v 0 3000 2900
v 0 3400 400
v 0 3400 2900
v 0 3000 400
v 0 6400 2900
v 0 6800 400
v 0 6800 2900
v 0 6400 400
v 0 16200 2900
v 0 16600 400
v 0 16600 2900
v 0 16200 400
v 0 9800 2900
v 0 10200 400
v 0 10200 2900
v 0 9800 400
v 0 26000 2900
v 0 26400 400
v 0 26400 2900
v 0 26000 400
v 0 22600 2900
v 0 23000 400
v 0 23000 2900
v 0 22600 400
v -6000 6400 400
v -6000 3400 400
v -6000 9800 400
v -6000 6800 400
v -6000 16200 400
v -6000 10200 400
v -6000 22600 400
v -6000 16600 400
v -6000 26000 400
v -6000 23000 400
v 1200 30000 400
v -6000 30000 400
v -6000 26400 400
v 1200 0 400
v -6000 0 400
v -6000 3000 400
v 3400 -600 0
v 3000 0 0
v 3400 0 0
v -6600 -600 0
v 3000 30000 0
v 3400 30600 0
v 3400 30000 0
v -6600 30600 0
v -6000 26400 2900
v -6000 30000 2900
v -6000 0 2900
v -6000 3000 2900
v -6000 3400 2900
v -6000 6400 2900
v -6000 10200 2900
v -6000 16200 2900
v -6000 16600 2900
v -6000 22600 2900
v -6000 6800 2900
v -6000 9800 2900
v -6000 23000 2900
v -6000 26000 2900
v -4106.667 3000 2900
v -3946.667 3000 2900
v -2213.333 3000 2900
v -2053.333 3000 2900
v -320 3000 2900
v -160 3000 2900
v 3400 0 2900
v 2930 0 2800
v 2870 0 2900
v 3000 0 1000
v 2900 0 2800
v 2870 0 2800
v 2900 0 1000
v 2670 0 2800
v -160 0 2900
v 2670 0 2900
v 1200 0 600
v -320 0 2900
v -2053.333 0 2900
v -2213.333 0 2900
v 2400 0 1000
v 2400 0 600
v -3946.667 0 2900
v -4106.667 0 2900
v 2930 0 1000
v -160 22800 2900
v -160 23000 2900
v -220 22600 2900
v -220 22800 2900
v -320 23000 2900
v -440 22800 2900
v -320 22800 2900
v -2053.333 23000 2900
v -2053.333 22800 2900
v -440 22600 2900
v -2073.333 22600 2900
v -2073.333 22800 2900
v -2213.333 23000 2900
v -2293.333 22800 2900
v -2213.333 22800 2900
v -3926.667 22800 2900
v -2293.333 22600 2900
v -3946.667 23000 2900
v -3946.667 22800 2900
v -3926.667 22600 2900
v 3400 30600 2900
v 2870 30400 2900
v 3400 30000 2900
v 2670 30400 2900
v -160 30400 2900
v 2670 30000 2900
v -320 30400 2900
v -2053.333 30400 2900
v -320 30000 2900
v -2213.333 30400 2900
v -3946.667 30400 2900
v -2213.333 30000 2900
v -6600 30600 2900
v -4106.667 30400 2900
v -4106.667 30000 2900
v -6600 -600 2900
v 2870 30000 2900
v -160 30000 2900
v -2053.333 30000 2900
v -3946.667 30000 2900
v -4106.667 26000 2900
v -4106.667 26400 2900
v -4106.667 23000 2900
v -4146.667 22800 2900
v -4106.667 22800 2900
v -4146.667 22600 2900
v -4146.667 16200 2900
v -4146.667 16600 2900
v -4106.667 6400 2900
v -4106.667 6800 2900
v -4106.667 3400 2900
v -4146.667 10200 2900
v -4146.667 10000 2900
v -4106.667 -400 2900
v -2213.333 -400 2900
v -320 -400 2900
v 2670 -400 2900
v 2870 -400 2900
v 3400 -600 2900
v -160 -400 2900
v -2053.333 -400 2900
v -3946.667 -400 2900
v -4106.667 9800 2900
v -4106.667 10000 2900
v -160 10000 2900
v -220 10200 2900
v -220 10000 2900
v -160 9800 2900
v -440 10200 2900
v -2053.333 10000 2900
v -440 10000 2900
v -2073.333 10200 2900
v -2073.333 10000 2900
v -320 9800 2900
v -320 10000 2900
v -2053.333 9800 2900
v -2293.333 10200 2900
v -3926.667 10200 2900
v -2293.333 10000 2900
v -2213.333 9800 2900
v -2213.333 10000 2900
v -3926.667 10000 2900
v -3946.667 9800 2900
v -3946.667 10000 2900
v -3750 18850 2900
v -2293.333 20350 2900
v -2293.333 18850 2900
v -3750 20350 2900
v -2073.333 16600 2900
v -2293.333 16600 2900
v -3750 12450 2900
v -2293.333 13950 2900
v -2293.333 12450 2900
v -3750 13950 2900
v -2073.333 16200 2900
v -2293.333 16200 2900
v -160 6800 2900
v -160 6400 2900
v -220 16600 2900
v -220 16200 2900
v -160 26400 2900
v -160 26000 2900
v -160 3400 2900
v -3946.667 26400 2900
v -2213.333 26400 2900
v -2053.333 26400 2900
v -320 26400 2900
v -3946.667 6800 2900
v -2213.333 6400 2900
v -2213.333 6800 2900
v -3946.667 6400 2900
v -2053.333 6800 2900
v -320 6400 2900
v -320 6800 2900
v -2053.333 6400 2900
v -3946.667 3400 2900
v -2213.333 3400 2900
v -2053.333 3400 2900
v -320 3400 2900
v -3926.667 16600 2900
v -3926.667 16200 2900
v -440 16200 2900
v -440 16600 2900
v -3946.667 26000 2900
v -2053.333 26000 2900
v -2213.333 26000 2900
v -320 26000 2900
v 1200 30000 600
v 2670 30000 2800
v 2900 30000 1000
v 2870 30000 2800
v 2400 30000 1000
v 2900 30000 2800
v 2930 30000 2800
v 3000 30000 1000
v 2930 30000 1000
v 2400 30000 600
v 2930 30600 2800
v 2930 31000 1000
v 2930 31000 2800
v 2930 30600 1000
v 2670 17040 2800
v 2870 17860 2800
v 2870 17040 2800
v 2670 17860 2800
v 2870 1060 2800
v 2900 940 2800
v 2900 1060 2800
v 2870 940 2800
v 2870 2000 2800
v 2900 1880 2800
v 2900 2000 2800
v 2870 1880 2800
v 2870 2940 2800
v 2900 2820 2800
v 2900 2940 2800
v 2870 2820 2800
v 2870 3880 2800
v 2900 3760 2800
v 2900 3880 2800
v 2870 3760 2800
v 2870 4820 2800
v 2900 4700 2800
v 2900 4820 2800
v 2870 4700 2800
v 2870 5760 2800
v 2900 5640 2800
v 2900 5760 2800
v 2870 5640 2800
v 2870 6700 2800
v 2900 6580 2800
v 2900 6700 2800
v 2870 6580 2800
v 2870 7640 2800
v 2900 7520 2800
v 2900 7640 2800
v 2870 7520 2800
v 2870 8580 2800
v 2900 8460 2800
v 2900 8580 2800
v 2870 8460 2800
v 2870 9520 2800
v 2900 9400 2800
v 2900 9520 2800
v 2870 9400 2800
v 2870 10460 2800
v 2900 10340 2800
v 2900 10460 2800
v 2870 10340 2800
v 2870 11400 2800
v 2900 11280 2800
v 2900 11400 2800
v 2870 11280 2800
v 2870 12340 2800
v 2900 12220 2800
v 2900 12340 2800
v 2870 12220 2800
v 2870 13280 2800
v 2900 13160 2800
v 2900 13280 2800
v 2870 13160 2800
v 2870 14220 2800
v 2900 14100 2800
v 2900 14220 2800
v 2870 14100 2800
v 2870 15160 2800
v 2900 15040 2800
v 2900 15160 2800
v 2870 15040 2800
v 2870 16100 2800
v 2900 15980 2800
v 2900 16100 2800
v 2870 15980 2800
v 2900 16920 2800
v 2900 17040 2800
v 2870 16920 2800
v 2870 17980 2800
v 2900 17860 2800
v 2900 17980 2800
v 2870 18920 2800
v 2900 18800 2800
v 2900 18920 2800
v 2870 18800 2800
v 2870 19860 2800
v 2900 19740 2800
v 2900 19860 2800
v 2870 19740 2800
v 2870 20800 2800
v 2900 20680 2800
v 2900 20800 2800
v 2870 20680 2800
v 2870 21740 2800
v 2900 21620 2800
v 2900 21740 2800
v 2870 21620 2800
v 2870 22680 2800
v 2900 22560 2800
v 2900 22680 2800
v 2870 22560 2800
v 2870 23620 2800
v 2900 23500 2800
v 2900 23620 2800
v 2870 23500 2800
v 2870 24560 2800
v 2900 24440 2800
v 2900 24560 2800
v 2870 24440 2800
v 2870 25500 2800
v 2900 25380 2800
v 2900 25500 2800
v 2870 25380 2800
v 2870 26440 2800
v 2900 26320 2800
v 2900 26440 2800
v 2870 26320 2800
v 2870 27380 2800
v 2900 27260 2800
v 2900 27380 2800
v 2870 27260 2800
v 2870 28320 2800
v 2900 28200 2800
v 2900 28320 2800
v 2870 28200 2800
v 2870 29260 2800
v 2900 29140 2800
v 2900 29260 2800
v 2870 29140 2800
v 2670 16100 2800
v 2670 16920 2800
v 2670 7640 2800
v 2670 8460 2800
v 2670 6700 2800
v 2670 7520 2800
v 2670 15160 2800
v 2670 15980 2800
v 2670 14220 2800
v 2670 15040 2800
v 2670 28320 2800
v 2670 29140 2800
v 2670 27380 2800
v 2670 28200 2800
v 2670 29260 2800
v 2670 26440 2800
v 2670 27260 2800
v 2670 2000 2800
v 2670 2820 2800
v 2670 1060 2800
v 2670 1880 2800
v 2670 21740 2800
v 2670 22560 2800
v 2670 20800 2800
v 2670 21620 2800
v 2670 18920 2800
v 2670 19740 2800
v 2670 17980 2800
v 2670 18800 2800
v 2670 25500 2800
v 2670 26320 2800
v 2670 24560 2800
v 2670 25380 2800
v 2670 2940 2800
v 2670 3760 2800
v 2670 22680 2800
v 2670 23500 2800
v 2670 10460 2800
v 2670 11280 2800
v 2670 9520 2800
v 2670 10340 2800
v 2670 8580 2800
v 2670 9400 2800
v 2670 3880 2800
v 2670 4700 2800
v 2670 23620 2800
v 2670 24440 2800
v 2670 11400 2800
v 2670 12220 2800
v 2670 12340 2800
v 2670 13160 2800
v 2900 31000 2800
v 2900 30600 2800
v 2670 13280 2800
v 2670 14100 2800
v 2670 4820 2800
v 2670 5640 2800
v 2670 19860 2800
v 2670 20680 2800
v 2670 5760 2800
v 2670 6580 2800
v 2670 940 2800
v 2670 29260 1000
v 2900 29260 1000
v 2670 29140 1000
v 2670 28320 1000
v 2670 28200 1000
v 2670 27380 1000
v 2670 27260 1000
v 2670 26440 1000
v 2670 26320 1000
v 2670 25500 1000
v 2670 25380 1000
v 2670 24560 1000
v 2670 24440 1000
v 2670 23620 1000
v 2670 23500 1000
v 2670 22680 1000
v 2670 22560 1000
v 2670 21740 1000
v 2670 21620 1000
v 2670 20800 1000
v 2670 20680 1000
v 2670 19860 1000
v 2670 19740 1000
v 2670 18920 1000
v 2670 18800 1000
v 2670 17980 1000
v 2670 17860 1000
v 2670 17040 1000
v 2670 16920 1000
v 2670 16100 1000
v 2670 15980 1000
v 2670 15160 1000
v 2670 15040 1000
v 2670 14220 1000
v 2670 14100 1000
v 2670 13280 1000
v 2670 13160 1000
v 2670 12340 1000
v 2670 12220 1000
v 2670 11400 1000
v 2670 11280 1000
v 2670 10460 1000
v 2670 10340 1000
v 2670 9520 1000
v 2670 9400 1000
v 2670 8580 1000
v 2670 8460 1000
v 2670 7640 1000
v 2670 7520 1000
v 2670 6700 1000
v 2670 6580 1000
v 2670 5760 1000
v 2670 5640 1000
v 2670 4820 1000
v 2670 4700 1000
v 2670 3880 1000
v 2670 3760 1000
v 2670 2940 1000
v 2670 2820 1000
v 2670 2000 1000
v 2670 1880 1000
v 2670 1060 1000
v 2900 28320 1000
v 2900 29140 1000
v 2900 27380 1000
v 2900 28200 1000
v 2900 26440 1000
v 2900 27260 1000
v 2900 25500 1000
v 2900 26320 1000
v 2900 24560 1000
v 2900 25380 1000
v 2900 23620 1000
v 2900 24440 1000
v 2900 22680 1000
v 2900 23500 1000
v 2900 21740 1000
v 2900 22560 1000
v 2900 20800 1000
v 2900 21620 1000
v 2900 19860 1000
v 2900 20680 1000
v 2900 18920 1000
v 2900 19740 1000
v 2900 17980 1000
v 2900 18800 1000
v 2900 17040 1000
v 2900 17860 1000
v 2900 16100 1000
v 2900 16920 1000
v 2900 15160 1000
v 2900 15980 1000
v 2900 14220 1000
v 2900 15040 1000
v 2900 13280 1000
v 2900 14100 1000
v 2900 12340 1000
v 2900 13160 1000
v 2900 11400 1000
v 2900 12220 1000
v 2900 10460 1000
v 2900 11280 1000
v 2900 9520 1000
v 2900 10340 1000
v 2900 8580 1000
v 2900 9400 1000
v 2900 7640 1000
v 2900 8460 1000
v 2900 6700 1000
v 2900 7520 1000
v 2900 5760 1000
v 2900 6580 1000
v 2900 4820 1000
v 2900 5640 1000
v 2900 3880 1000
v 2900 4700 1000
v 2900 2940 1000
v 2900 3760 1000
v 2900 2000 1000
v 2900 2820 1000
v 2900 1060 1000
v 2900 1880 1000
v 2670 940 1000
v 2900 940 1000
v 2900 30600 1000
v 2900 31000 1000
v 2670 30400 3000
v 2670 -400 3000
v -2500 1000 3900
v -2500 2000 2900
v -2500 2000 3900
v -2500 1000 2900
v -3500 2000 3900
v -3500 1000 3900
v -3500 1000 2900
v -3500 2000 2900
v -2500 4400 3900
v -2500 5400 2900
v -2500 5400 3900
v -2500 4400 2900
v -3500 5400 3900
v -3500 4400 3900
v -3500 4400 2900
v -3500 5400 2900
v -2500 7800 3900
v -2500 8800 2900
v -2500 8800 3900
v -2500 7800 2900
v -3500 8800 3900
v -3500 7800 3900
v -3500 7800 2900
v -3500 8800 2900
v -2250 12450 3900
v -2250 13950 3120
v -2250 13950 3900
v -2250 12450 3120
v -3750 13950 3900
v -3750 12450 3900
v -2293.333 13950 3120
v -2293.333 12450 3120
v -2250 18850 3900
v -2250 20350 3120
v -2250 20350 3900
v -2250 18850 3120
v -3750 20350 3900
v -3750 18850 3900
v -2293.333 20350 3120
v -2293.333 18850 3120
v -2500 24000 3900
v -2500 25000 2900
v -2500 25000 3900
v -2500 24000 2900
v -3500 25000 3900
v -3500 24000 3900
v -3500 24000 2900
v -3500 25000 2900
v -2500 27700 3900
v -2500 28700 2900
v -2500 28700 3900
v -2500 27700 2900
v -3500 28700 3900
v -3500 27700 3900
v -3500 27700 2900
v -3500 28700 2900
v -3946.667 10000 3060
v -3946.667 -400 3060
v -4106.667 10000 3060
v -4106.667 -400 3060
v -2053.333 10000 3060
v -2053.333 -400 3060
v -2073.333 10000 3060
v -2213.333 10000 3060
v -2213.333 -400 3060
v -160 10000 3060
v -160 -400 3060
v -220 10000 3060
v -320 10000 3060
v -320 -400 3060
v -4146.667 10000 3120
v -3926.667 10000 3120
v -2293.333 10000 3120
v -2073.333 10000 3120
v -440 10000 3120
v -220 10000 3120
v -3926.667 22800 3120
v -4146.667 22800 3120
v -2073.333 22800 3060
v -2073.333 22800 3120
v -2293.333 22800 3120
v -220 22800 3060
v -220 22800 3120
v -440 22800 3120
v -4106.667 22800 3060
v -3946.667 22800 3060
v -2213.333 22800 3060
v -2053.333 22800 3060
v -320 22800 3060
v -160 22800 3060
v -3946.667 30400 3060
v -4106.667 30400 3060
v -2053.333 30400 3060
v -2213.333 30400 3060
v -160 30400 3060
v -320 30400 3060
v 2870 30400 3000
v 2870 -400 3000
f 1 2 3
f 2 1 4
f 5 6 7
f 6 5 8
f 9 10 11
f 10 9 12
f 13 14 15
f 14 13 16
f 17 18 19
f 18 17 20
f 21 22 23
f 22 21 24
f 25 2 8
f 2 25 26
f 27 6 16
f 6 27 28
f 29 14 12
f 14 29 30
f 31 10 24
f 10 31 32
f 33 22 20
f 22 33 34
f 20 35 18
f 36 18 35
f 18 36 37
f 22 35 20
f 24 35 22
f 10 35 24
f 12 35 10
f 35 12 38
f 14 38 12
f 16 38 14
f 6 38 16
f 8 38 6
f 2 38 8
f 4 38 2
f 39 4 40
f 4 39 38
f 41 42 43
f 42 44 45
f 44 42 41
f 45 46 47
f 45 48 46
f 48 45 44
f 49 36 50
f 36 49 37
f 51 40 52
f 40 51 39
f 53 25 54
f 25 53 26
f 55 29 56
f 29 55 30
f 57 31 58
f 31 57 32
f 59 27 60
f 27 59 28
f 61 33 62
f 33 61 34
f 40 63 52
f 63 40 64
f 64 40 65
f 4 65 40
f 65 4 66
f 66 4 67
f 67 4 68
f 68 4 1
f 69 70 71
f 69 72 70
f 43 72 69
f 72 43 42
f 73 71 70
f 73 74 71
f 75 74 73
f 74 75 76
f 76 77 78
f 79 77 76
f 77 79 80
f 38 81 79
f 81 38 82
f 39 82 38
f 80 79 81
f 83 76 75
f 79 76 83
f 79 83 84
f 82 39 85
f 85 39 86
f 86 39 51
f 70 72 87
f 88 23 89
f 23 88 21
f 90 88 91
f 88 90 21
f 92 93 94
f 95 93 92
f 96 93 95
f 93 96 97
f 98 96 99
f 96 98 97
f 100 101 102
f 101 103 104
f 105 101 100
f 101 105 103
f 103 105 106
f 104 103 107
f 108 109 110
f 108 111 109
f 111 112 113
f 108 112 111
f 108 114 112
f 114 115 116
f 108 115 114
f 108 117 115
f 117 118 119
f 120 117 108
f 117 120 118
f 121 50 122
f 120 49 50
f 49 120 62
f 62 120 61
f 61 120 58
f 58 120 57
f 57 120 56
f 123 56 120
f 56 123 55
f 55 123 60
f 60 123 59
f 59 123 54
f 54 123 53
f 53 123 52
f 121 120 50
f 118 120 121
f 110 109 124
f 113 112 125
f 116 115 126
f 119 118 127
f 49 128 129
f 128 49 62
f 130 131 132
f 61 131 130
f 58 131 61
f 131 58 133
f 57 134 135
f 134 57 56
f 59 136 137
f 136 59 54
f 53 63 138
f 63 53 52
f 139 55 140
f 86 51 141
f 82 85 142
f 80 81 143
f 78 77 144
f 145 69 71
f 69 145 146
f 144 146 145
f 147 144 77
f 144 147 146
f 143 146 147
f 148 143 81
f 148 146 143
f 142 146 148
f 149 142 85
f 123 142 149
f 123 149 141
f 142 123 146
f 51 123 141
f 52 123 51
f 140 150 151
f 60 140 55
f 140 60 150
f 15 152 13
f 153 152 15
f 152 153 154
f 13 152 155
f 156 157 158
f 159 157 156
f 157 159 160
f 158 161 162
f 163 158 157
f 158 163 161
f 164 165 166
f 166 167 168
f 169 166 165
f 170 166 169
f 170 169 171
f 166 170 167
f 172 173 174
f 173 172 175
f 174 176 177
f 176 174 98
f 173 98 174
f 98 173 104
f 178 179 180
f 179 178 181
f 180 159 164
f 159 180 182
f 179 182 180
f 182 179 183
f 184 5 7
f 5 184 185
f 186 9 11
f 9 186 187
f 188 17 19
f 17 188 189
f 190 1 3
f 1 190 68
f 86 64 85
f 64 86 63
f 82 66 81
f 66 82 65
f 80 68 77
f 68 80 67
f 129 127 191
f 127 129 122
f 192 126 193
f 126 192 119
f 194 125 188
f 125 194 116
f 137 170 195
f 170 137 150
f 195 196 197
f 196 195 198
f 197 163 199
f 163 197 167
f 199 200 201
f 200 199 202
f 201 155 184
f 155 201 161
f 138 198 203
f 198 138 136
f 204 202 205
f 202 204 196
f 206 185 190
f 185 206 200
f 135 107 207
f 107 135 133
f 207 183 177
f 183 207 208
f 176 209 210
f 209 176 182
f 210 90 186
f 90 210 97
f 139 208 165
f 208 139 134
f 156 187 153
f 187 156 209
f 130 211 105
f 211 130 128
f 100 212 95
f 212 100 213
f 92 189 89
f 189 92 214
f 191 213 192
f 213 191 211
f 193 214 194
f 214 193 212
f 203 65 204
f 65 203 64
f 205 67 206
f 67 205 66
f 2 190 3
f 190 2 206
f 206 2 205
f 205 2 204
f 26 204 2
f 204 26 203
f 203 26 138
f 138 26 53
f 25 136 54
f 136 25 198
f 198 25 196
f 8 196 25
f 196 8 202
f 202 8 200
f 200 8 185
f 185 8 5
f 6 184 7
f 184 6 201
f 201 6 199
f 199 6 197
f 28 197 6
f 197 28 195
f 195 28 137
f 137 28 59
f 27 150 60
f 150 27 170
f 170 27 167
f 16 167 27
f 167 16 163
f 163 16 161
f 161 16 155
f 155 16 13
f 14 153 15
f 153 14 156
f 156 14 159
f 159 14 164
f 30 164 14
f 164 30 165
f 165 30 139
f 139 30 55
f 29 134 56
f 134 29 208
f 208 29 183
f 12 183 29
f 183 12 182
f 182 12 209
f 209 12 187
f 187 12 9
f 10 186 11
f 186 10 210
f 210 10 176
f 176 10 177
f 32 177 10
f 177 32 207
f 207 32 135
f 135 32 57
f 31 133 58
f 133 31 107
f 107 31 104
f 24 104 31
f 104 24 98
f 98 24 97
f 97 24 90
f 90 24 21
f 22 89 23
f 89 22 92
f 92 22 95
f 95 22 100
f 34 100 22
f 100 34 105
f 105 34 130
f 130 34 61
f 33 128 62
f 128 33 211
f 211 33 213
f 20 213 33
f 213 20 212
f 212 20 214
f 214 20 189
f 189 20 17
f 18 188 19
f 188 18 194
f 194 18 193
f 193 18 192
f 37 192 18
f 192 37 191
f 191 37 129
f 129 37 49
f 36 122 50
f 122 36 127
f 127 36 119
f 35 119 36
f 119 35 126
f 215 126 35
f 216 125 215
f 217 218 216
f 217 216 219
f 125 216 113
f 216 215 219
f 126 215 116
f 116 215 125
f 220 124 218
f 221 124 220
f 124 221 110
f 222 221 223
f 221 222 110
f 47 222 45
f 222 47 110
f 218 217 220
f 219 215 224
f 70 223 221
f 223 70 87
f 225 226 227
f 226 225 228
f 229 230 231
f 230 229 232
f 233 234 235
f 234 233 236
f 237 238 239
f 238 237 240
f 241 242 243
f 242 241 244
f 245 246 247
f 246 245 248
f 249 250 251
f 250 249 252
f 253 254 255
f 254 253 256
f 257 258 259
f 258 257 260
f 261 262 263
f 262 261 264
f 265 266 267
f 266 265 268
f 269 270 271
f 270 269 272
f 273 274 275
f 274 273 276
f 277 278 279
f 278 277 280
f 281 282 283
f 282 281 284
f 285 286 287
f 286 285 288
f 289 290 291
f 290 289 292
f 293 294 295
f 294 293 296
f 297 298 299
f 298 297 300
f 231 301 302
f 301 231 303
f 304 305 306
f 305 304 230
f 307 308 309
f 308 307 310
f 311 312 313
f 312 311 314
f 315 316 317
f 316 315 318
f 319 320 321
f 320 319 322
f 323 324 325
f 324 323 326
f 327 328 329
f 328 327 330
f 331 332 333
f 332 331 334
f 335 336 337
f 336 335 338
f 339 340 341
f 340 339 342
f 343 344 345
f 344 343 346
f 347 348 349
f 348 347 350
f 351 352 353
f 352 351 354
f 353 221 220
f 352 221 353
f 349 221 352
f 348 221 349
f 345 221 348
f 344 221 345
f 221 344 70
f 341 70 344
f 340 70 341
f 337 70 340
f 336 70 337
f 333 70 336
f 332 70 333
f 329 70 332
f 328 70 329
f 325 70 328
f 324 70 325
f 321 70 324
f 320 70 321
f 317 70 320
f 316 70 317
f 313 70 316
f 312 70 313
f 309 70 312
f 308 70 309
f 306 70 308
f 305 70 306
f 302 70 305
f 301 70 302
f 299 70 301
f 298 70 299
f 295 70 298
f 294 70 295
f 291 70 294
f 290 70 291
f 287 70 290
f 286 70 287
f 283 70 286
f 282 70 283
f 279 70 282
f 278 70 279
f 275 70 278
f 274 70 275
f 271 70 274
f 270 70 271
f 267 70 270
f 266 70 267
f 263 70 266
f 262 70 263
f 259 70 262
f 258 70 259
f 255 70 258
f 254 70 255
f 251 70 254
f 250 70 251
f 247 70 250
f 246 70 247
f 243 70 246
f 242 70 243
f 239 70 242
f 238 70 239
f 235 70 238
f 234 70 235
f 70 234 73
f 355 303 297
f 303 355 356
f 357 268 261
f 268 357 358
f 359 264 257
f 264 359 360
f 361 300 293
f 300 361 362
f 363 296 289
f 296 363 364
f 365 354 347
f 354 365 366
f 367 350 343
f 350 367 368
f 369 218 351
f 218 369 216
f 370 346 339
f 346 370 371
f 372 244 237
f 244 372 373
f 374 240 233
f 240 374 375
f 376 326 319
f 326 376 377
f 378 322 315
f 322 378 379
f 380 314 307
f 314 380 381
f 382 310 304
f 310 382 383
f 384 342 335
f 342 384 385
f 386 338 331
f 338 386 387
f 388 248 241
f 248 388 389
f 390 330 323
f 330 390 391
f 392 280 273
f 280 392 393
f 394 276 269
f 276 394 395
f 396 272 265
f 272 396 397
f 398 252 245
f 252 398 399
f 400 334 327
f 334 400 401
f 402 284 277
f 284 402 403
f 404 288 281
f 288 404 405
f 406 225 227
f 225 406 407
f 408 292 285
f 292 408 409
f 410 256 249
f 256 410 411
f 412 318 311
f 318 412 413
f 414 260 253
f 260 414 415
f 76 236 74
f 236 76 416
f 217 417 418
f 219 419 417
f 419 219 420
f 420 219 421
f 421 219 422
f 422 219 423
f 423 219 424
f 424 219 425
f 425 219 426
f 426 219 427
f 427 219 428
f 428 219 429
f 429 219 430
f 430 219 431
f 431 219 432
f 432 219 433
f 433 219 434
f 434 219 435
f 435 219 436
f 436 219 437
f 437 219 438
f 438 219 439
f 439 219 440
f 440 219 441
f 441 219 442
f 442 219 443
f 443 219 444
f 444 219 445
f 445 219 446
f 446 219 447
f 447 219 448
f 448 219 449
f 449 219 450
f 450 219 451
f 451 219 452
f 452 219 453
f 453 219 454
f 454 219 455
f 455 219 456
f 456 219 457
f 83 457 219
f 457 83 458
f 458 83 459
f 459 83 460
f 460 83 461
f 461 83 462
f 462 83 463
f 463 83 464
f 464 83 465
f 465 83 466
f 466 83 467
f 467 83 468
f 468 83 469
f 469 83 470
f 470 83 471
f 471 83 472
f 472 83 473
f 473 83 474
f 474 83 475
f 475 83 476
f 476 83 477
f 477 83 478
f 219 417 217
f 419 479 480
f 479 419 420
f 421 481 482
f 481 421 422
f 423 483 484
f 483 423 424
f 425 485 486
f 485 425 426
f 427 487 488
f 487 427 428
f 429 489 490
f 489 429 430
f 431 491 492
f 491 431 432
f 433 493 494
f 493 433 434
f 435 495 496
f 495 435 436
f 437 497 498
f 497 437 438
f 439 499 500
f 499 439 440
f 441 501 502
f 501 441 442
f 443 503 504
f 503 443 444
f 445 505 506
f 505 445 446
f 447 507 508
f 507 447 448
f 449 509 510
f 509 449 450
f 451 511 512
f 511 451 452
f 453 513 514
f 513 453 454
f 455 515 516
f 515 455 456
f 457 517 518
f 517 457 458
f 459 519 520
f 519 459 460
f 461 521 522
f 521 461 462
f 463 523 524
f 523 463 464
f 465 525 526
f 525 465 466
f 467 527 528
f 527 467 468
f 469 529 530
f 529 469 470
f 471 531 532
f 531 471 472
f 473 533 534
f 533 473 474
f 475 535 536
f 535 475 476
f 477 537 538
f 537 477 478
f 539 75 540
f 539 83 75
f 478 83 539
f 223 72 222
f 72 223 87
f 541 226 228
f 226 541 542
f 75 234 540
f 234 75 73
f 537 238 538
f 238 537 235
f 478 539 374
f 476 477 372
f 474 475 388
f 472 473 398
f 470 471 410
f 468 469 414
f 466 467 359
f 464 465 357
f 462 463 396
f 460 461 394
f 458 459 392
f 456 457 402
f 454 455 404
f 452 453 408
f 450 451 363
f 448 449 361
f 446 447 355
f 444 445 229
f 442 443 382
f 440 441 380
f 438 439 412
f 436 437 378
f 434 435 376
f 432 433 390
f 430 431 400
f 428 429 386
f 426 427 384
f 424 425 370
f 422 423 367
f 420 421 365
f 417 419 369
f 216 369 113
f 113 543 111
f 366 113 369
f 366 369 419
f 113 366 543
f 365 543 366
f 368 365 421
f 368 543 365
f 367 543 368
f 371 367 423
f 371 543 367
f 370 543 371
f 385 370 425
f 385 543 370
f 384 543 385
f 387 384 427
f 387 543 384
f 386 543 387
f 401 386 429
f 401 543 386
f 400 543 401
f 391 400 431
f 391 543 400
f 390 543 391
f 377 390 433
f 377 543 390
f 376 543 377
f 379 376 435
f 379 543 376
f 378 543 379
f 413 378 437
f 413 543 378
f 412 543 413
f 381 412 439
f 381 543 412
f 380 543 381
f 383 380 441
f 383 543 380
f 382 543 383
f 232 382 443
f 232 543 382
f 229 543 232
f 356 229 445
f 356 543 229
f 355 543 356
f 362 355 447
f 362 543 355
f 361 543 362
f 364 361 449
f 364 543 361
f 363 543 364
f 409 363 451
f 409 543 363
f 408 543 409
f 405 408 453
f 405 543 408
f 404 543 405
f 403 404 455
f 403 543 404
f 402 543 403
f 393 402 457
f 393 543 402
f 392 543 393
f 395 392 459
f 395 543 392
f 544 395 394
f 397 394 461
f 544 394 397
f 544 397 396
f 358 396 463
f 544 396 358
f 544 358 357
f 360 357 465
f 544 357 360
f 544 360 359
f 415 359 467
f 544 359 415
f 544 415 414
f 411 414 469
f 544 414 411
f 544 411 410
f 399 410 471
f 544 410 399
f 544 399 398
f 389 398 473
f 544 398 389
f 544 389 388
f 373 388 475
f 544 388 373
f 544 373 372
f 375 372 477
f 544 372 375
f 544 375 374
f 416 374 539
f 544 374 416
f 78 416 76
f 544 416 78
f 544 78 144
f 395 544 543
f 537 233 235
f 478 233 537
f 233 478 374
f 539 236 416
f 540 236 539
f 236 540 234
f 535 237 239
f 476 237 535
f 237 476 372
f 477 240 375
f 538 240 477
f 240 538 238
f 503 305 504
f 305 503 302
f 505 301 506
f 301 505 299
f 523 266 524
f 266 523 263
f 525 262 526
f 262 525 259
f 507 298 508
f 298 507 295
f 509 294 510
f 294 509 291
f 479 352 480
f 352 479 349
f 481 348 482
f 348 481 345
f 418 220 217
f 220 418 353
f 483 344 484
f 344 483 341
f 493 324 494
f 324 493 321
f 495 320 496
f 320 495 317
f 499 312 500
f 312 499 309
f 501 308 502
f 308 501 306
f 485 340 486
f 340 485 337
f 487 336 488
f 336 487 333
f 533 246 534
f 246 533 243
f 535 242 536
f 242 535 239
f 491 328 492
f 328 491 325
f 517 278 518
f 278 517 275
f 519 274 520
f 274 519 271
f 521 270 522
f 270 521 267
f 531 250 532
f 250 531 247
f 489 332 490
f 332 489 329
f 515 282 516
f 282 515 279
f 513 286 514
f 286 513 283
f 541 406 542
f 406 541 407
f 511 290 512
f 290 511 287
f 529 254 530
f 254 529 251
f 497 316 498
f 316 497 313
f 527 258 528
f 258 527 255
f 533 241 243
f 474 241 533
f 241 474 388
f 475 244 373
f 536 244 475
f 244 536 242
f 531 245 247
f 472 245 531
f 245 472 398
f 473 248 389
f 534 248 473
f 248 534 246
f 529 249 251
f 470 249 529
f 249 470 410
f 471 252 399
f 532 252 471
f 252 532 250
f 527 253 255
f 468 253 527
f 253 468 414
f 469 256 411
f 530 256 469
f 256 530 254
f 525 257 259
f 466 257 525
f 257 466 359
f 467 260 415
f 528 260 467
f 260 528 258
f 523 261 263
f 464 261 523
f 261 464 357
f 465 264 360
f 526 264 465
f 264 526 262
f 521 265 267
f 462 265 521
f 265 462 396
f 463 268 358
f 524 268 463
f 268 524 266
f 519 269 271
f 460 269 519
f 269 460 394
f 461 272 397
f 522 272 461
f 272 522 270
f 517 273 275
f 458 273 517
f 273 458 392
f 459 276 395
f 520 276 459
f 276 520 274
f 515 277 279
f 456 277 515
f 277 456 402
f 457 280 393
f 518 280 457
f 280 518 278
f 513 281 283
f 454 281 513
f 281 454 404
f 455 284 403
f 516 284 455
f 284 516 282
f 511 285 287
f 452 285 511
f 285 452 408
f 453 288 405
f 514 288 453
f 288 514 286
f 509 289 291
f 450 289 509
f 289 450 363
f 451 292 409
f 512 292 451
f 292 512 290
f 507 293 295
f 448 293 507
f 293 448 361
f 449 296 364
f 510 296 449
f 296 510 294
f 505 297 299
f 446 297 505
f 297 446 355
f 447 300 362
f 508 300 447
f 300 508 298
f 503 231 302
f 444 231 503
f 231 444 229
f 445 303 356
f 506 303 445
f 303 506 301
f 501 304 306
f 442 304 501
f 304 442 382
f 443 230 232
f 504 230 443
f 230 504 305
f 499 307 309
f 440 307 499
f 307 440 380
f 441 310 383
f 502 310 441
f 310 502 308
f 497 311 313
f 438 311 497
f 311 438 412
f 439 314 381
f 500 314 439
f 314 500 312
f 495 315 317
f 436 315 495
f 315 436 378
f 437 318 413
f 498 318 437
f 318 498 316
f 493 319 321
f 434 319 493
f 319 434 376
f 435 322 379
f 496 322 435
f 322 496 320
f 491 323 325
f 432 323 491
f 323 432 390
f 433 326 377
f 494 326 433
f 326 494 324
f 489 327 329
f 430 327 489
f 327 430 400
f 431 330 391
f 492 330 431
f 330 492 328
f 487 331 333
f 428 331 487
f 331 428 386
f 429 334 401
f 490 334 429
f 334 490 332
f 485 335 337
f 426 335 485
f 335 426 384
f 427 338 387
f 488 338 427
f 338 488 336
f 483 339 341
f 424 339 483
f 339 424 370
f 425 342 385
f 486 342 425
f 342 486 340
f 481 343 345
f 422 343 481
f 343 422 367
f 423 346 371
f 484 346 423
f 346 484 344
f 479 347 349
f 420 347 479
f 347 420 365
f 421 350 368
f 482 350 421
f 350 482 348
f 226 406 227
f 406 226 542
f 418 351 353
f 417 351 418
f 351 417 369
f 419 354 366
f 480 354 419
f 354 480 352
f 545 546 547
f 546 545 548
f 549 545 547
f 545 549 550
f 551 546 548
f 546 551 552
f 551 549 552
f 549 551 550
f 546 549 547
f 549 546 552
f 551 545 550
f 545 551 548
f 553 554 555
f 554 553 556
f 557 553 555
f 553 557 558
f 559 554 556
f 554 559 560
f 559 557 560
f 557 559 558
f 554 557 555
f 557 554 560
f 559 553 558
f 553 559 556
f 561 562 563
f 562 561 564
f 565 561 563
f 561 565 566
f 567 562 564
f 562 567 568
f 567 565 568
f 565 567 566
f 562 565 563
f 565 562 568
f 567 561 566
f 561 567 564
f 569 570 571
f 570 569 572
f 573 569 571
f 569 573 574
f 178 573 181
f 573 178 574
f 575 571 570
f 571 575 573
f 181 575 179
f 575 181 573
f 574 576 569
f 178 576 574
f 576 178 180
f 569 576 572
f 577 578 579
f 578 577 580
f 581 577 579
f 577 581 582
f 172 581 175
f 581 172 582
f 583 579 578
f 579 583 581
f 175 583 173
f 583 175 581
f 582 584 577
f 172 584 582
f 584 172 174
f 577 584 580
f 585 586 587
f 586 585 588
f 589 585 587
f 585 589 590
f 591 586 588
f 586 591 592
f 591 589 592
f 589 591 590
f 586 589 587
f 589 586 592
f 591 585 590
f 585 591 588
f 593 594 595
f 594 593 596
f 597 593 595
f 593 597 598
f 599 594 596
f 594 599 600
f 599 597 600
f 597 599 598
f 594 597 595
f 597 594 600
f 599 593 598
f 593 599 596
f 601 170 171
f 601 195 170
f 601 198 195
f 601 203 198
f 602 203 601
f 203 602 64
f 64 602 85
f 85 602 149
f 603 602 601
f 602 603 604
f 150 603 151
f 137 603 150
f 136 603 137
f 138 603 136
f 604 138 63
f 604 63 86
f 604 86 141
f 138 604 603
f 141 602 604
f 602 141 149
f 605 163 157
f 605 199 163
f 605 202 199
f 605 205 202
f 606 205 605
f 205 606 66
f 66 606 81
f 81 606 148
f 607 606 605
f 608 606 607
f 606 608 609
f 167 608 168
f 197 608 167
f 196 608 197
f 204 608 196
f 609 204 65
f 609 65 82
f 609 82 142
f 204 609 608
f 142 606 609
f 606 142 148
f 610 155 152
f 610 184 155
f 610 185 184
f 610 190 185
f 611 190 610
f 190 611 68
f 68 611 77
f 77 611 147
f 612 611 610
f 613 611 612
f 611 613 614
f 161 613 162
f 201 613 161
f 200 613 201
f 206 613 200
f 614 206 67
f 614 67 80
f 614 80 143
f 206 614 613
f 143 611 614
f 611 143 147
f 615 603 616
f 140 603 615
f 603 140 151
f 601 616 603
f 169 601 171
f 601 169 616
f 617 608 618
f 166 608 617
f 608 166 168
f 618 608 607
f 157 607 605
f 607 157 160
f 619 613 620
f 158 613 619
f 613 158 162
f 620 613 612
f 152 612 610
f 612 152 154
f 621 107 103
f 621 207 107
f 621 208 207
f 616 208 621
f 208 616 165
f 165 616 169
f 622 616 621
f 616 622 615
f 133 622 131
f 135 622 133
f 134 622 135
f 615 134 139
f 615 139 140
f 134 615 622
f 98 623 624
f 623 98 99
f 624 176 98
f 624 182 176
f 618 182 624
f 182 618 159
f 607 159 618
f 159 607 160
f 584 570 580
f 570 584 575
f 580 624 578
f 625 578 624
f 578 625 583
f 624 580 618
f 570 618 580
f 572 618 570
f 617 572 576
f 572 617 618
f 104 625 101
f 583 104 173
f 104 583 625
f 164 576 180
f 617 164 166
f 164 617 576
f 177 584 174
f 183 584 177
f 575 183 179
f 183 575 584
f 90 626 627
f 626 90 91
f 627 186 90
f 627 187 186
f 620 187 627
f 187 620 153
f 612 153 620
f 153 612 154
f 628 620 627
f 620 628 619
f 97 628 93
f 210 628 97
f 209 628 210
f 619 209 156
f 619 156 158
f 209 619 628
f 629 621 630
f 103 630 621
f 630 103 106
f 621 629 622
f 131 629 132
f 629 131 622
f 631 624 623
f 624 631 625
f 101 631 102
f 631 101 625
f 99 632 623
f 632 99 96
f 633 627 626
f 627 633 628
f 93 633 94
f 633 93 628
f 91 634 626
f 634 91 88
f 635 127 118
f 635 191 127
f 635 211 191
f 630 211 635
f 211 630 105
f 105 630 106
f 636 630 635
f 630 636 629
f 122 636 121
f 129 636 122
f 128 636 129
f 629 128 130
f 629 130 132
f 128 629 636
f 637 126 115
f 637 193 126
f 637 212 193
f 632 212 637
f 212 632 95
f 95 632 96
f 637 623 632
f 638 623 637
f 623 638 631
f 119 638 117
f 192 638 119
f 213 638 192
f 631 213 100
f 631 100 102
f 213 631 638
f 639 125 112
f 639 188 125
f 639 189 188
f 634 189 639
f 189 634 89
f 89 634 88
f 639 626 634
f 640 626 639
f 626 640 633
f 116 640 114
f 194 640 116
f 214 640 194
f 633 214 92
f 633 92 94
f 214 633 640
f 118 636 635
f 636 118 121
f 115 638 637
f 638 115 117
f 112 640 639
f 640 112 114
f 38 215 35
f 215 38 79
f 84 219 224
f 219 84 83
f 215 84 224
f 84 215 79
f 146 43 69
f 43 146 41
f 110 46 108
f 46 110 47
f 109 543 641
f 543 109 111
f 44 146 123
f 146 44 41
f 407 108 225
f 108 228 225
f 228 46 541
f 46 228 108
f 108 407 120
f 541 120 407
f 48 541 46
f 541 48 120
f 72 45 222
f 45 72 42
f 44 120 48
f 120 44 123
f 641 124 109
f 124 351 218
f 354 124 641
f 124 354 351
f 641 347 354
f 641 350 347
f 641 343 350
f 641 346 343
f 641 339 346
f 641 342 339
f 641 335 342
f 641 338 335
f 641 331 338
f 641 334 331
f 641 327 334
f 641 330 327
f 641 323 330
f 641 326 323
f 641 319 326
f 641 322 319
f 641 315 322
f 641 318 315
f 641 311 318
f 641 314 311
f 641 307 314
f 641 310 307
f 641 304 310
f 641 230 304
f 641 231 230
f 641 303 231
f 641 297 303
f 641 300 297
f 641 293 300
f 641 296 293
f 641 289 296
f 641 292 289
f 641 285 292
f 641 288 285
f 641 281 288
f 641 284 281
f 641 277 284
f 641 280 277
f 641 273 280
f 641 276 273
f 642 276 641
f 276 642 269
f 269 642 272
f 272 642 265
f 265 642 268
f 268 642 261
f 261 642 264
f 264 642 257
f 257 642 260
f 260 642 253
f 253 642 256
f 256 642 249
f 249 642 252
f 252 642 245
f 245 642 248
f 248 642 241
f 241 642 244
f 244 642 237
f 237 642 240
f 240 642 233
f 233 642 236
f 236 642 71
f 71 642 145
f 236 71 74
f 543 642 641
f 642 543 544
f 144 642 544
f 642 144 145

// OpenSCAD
// Earthship Generator  with RammedEarth Walls + Insulation on External Walls
// One additional room 
// Rooms : 18 sqm * 4 + 21.6 sqm
// Main Rooms: 36 sqm * 2
// Corridor = 36 sqm
// Plan Surface = 36 sqm
//  Total = 237 sqm
// (c) 2022 Julien BOUCARON under MIT License

// Transform everything from meters to mm
scaleFactor = 1000.0;

// Length in meters of the corridor
length = 30.0;

// Window
windowAngle = 90.0; // Not used
windowHeight = 1.8;
windowWidth = 1.0;
windowDepth = 0.03;
windowColor = "LightBlue";
windowColorAlpha = 0.3;

// WindowChassis
windowChassisWidth = 0.120;
windowChassisHeight = 0.200;
windowChassisColor = "Brown";

// PlantZone between the window and the main corridor
plantZoneWidth = 1.2;
plantHeight = 0.6;
plantColor = "DarkGreen";

// Corridor
corridorWidth = 1.2;
corridorHeight = 0.4;
corridorColor = "MediumBlue";

// "Rooms"
roomColor = "Gold";
roomHeight = 0.4;
roomLength = 6.0;
// room wall internal width
roomWallInternalWidth = 0.4; // Non insulated 
roomWallInternalHeight = 2.5 + roomHeight;
roomWallInternalColor = "Grey";
// List of rooms width
roomListWidth = [0.0, 3.0 , 
    3.0 + roomWallInternalWidth, 3.0,
    6.0 + 2 * roomWallInternalWidth, 3.0,
    9.0 + 3 * roomWallInternalWidth, 6.0,
    15.0 + 4 * roomWallInternalWidth, 6.0,
    21.0 + 5 * roomWallInternalWidth, 3.0,
    24.0 + 6 * roomWallInternalWidth, 3.6];            
     

// LightWells for Rooms
lightWellColor = "LightBlue";
lightWellColorAlpha = 0.3;
lightWellColorHeight = 1.0;
lightWellList = [ 1.0 ,  1.0,
    1.0, 1.0,
    1.0, 1.0,   
    1.5, 1.5,
    1.5, 1.5,
    1.0, 1.0,
    1.0, 1.0];
            
// External Walls - Insulated
// NB: This is just a "visualization", all external insulations are not open to the outside element and form a single wall around the whole house
wallSideWidthExternal = 0.2;
wallSideWidthInternal = 0.2;
wallSideWidthInsulation = 0.2;
wallSideColor = "Red";
wallSideInsulationColor = "Grey";
wallSideFrontOffset = 1.0;

frontWallWidthExternal = 0.2;
frontWallWidthInternal = 0.2;
frontWallWidthInsulation = 0.2;
frontWallHeight = 1.0;
frontWallColor = "Violet";
frontWallInsulationColor = "Grey";

backWallWidthExternal = 0.2;
backWallWidthInternal = 0.2;
backWallWidthInsulation = 0.2;
backWallHeight = roomWallInternalHeight;
backWallColor = "Violet";
backWallInsulationColor = "Grey";


// Beams (assuming IPE) - assuming about 6 Ton load per beam (just a guess)
roomBeamColor = "Indigo";
roomBeamsList= [ 0.16, 0.16,
    0.16, 0.16,
    0.16, 0.16,
    0.22, 0.22,
    0.22, 0.22,
    0.16, 0.16,
    0.16, 0.16
];
roomBeamsCountList = [ 3, 3,
    3, 3,
    3, 3,
    3, 3,
    3, 3,
    3, 3,
    3, 3
];




// Generating corridor
color(corridorColor) cube([corridorWidth * scaleFactor, length * scaleFactor, corridorHeight * scaleFactor]);
// Generating plantZone
translate([corridorWidth * scaleFactor, 0, 0]) color(plantColor) cube([plantZoneWidth * scaleFactor, length * scaleFactor, plantHeight * scaleFactor]);
// Generating rooms
for( i = [0:2:len(roomListWidth) -1]) {
    // Debug
   echo("Index " ); echo(i);
   
    translate([ - roomLength * scaleFactor, roomListWidth[i] * scaleFactor,  0]) color(roomColor) cube([roomLength * scaleFactor,   roomListWidth[i+1] * scaleFactor, roomHeight * scaleFactor]);
    // Walls
    // Debug
     echo("Room Internal Wall Offset "); echo(roomListWidth[i+1] * scaleFactor);
    if ( i < len(roomListWidth) - 2 ) {
       translate([ - roomLength * scaleFactor, (roomListWidth[i] + roomListWidth[i+1]) * scaleFactor,  0]) color(roomWallInternalColor) cube([roomLength * scaleFactor,   roomWallInternalWidth * scaleFactor, roomWallInternalHeight * scaleFactor]);
    }
}
// Generate Side Walls
translate([ - roomLength * scaleFactor, - wallSideWidthInternal * scaleFactor, 0]) color(wallSideColor) cube([( plantZoneWidth + corridorWidth + roomLength + wallSideFrontOffset) * scaleFactor, wallSideWidthInternal * scaleFactor, roomWallInternalHeight * scaleFactor]);
translate([ - roomLength * scaleFactor, length  * scaleFactor, 0]) color(wallSideColor) cube([( plantZoneWidth + corridorWidth + roomLength + wallSideFrontOffset) * scaleFactor, wallSideWidthInternal * scaleFactor, roomWallInternalHeight * scaleFactor]);
translate([ - roomLength * scaleFactor, (- wallSideWidthExternal - wallSideWidthInsulation) * scaleFactor, 0]) color(wallSideInsulationColor) cube([( plantZoneWidth + corridorWidth + roomLength + wallSideFrontOffset) * scaleFactor, wallSideWidthInternal * scaleFactor, roomWallInternalHeight * scaleFactor]);
translate([ - roomLength * scaleFactor, (wallSideWidthInsulation + length)  * scaleFactor, 0]) color(wallSideInsulationColor) cube([( plantZoneWidth + corridorWidth + roomLength + wallSideFrontOffset) * scaleFactor, wallSideWidthInternal * scaleFactor, roomWallInternalHeight * scaleFactor]);
translate([ - roomLength * scaleFactor, (- wallSideWidthExternal - wallSideWidthInsulation - wallSideWidthExternal) * scaleFactor, 0]) color(wallSideColor) cube([( plantZoneWidth + corridorWidth + roomLength + wallSideFrontOffset) * scaleFactor, wallSideWidthInternal * scaleFactor, roomWallInternalHeight * scaleFactor]);
translate([ - roomLength * scaleFactor, (wallSideWidthExternal+ wallSideWidthInsulation + length)  * scaleFactor, 0]) color(wallSideColor) cube([( plantZoneWidth + corridorWidth + roomLength + wallSideFrontOffset) * scaleFactor, wallSideWidthInternal * scaleFactor, roomWallInternalHeight * scaleFactor]);
// Generate Front Wall
translate([(corridorWidth + plantZoneWidth  ) * scaleFactor, 0, 0]) color(frontWallColor) cube([ frontWallWidthInternal* scaleFactor, length * scaleFactor , frontWallHeight * scaleFactor]);
translate([(corridorWidth + plantZoneWidth + frontWallWidthInternal ) * scaleFactor, 0, 0]) color(frontWallInsulationColor) cube([ frontWallWidthInsulation* scaleFactor, length * scaleFactor , frontWallHeight * scaleFactor]);
translate([(corridorWidth + plantZoneWidth + frontWallWidthInternal + frontWallWidthInsulation ) * scaleFactor, 0, 0]) color(frontWallColor) cube([ frontWallWidthExternal* scaleFactor, length * scaleFactor , frontWallHeight * scaleFactor]);
// Generate Back Wall
translate([-(roomLength +backWallWidthInternal ) * scaleFactor, - (wallSideWidthExternal +wallSideWidthInsulation + wallSideWidthInternal ) * scaleFactor, 0]) color(backWallColor) cube([ backWallWidthInternal* scaleFactor, ( length + 2.0 * (wallSideWidthExternal +wallSideWidthInsulation + wallSideWidthInternal ))  * scaleFactor , backWallHeight * scaleFactor]);
translate([-(roomLength +backWallWidthInternal + backWallWidthInsulation ) * scaleFactor, - (wallSideWidthExternal +wallSideWidthInsulation + wallSideWidthInternal ) * scaleFactor, 0]) color(backWallInsulationColor) cube([ backWallWidthInsulation* scaleFactor, ( length + 2.0 * (wallSideWidthExternal +wallSideWidthInsulation + wallSideWidthInternal ))  * scaleFactor , backWallHeight * scaleFactor]);
translate([-(roomLength +backWallWidthInternal + backWallWidthInsulation + backWallWidthExternal ) * scaleFactor, - (wallSideWidthExternal +wallSideWidthInsulation + wallSideWidthInternal ) * scaleFactor, 0]) color(backWallColor) cube([ backWallWidthExternal * scaleFactor, ( length + 2.0 * (wallSideWidthExternal +wallSideWidthInsulation + wallSideWidthInternal ))  * scaleFactor , backWallHeight * scaleFactor]);
// Generate windows + chassis
for( i = [0:windowWidth:length]) {
    // Debug
    echo ("Index Window "); echo (i);
    translate([ (corridorWidth + plantZoneWidth + frontWallWidthInternal  + frontWallWidthInsulation + 0.5 *  frontWallWidthExternal ) * scaleFactor, i * windowWidth * scaleFactor, frontWallHeight * scaleFactor]) color(windowColor, windowColorAlpha) cube([windowDepth * scaleFactor, windowWidth * scaleFactor,  windowHeight * scaleFactor]);
    translate([ (corridorWidth + plantZoneWidth - windowDepth - windowChassisHeight + frontWallWidthInternal  + frontWallWidthInsulation  + 0.5 *  frontWallWidthExternal ) * scaleFactor, ( i + 1) * (windowWidth - 0.5 * windowChassisWidth) * scaleFactor, frontWallHeight * scaleFactor]) color(windowChassisColor) cube([ (windowDepth + windowChassisHeight) * scaleFactor, windowChassisWidth * scaleFactor,  windowHeight * scaleFactor]);
}
// Add chassis Beam all along
 translate([ (corridorWidth + plantZoneWidth - windowDepth - windowChassisHeight + frontWallWidthInternal  + frontWallWidthInsulation  + 0.5 *  frontWallWidthExternal ) * scaleFactor, -(wallSideWidthInternal + wallSideWidthInsulation) * scaleFactor, (windowHeight + frontWallHeight) * scaleFactor]) color(windowChassisColor) cube([ (windowChassisHeight) * scaleFactor, (length + 2 * (wallSideWidthInternal + wallSideWidthInsulation)) * scaleFactor,  windowChassisHeight * scaleFactor]);

// Generate Light Wells for Rooms
for( i = [0:2:len(lightWellList) -1]) {
    // Debug
   echo("Light Well Index " ); echo(i);
   
    translate([ (- roomLength/2 - lightWellList[i]/2 )  * scaleFactor,  (roomListWidth[i] + roomListWidth[i+1]/2 - lightWellList[i+1]/2 )  * scaleFactor,  roomWallInternalHeight * scaleFactor]) color(lightWellColor, lightWellColorAlpha) cube([lightWellList[i] * scaleFactor,   lightWellList[i+1] * scaleFactor, lightWellColorHeight * scaleFactor]);
    // Walls
}


// Generate Beams for Rooms
for( i = [0:2:len(roomBeamsList) -1]) {
    for( j = [0:1:roomBeamsCountList[i]-1]) {
        
        echo(str("Beams Distance to remove = ",(roomBeamsCountList[i]*roomBeamsList[i]) ));
        dist = (roomLength - ((roomBeamsCountList[i]-1)*roomBeamsList[i]))/roomBeamsCountList[i];
        
    // Debug
   echo("Room Beams List Index " ); echo(i);
        if ( i == len(roomBeamsList) -2) {
            translate([ (- roomLength + (j+1) * dist) * scaleFactor, (roomListWidth[i] - roomWallInternalWidth/2)* scaleFactor, roomWallInternalHeight * scaleFactor ]) color(roomBeamColor) cube([ roomBeamsList[i] * scaleFactor, (roomListWidth[i+1]  + roomWallInternalWidth * 1.5) * scaleFactor , roomBeamsList[i+1] * scaleFactor]);
        }
        else if ( i != 0 ) {
            translate([ (- roomLength + (j+1) * dist) * scaleFactor, (roomListWidth[i] - roomWallInternalWidth/2)* scaleFactor, roomWallInternalHeight * scaleFactor ]) color(roomBeamColor) cube([ roomBeamsList[i] * scaleFactor, (roomListWidth[i+1]  + roomWallInternalWidth ) * scaleFactor , roomBeamsList[i+1] * scaleFactor]);
        }       
        else {
             translate([ (- roomLength + (j+1) * dist) * scaleFactor, (roomListWidth[i] - roomWallInternalWidth)* scaleFactor, roomWallInternalHeight * scaleFactor ]) color(roomBeamColor) cube([ roomBeamsList[i] * scaleFactor, (roomListWidth[i+1]  + roomWallInternalWidth * 1.5 ) * scaleFactor , roomBeamsList[i+1] * scaleFactor]);
        }
    }
     
}

// Generate Window Beam // TODO


// Stats
countWindows = length/windowWidth;
echo (str("Windows count = ",countWindows));
rooms = len(roomListWidth)/2;
echo (str("Rooms = ", rooms));
roomSurface = 0;
for( i = [0:2:len(roomListWidth) -1]) {
    currentRoomSurface = roomListWidth[i+1] * roomLength;
    echo (str("Surface Room[",i/2,"] = ", currentRoomSurface  ," square meters"));   
}
echo (str("Plant Surface = ", plantZoneWidth * length)," square meters");
echo (str("Corridor surface = ", corridorWidth * length," square meters"));
